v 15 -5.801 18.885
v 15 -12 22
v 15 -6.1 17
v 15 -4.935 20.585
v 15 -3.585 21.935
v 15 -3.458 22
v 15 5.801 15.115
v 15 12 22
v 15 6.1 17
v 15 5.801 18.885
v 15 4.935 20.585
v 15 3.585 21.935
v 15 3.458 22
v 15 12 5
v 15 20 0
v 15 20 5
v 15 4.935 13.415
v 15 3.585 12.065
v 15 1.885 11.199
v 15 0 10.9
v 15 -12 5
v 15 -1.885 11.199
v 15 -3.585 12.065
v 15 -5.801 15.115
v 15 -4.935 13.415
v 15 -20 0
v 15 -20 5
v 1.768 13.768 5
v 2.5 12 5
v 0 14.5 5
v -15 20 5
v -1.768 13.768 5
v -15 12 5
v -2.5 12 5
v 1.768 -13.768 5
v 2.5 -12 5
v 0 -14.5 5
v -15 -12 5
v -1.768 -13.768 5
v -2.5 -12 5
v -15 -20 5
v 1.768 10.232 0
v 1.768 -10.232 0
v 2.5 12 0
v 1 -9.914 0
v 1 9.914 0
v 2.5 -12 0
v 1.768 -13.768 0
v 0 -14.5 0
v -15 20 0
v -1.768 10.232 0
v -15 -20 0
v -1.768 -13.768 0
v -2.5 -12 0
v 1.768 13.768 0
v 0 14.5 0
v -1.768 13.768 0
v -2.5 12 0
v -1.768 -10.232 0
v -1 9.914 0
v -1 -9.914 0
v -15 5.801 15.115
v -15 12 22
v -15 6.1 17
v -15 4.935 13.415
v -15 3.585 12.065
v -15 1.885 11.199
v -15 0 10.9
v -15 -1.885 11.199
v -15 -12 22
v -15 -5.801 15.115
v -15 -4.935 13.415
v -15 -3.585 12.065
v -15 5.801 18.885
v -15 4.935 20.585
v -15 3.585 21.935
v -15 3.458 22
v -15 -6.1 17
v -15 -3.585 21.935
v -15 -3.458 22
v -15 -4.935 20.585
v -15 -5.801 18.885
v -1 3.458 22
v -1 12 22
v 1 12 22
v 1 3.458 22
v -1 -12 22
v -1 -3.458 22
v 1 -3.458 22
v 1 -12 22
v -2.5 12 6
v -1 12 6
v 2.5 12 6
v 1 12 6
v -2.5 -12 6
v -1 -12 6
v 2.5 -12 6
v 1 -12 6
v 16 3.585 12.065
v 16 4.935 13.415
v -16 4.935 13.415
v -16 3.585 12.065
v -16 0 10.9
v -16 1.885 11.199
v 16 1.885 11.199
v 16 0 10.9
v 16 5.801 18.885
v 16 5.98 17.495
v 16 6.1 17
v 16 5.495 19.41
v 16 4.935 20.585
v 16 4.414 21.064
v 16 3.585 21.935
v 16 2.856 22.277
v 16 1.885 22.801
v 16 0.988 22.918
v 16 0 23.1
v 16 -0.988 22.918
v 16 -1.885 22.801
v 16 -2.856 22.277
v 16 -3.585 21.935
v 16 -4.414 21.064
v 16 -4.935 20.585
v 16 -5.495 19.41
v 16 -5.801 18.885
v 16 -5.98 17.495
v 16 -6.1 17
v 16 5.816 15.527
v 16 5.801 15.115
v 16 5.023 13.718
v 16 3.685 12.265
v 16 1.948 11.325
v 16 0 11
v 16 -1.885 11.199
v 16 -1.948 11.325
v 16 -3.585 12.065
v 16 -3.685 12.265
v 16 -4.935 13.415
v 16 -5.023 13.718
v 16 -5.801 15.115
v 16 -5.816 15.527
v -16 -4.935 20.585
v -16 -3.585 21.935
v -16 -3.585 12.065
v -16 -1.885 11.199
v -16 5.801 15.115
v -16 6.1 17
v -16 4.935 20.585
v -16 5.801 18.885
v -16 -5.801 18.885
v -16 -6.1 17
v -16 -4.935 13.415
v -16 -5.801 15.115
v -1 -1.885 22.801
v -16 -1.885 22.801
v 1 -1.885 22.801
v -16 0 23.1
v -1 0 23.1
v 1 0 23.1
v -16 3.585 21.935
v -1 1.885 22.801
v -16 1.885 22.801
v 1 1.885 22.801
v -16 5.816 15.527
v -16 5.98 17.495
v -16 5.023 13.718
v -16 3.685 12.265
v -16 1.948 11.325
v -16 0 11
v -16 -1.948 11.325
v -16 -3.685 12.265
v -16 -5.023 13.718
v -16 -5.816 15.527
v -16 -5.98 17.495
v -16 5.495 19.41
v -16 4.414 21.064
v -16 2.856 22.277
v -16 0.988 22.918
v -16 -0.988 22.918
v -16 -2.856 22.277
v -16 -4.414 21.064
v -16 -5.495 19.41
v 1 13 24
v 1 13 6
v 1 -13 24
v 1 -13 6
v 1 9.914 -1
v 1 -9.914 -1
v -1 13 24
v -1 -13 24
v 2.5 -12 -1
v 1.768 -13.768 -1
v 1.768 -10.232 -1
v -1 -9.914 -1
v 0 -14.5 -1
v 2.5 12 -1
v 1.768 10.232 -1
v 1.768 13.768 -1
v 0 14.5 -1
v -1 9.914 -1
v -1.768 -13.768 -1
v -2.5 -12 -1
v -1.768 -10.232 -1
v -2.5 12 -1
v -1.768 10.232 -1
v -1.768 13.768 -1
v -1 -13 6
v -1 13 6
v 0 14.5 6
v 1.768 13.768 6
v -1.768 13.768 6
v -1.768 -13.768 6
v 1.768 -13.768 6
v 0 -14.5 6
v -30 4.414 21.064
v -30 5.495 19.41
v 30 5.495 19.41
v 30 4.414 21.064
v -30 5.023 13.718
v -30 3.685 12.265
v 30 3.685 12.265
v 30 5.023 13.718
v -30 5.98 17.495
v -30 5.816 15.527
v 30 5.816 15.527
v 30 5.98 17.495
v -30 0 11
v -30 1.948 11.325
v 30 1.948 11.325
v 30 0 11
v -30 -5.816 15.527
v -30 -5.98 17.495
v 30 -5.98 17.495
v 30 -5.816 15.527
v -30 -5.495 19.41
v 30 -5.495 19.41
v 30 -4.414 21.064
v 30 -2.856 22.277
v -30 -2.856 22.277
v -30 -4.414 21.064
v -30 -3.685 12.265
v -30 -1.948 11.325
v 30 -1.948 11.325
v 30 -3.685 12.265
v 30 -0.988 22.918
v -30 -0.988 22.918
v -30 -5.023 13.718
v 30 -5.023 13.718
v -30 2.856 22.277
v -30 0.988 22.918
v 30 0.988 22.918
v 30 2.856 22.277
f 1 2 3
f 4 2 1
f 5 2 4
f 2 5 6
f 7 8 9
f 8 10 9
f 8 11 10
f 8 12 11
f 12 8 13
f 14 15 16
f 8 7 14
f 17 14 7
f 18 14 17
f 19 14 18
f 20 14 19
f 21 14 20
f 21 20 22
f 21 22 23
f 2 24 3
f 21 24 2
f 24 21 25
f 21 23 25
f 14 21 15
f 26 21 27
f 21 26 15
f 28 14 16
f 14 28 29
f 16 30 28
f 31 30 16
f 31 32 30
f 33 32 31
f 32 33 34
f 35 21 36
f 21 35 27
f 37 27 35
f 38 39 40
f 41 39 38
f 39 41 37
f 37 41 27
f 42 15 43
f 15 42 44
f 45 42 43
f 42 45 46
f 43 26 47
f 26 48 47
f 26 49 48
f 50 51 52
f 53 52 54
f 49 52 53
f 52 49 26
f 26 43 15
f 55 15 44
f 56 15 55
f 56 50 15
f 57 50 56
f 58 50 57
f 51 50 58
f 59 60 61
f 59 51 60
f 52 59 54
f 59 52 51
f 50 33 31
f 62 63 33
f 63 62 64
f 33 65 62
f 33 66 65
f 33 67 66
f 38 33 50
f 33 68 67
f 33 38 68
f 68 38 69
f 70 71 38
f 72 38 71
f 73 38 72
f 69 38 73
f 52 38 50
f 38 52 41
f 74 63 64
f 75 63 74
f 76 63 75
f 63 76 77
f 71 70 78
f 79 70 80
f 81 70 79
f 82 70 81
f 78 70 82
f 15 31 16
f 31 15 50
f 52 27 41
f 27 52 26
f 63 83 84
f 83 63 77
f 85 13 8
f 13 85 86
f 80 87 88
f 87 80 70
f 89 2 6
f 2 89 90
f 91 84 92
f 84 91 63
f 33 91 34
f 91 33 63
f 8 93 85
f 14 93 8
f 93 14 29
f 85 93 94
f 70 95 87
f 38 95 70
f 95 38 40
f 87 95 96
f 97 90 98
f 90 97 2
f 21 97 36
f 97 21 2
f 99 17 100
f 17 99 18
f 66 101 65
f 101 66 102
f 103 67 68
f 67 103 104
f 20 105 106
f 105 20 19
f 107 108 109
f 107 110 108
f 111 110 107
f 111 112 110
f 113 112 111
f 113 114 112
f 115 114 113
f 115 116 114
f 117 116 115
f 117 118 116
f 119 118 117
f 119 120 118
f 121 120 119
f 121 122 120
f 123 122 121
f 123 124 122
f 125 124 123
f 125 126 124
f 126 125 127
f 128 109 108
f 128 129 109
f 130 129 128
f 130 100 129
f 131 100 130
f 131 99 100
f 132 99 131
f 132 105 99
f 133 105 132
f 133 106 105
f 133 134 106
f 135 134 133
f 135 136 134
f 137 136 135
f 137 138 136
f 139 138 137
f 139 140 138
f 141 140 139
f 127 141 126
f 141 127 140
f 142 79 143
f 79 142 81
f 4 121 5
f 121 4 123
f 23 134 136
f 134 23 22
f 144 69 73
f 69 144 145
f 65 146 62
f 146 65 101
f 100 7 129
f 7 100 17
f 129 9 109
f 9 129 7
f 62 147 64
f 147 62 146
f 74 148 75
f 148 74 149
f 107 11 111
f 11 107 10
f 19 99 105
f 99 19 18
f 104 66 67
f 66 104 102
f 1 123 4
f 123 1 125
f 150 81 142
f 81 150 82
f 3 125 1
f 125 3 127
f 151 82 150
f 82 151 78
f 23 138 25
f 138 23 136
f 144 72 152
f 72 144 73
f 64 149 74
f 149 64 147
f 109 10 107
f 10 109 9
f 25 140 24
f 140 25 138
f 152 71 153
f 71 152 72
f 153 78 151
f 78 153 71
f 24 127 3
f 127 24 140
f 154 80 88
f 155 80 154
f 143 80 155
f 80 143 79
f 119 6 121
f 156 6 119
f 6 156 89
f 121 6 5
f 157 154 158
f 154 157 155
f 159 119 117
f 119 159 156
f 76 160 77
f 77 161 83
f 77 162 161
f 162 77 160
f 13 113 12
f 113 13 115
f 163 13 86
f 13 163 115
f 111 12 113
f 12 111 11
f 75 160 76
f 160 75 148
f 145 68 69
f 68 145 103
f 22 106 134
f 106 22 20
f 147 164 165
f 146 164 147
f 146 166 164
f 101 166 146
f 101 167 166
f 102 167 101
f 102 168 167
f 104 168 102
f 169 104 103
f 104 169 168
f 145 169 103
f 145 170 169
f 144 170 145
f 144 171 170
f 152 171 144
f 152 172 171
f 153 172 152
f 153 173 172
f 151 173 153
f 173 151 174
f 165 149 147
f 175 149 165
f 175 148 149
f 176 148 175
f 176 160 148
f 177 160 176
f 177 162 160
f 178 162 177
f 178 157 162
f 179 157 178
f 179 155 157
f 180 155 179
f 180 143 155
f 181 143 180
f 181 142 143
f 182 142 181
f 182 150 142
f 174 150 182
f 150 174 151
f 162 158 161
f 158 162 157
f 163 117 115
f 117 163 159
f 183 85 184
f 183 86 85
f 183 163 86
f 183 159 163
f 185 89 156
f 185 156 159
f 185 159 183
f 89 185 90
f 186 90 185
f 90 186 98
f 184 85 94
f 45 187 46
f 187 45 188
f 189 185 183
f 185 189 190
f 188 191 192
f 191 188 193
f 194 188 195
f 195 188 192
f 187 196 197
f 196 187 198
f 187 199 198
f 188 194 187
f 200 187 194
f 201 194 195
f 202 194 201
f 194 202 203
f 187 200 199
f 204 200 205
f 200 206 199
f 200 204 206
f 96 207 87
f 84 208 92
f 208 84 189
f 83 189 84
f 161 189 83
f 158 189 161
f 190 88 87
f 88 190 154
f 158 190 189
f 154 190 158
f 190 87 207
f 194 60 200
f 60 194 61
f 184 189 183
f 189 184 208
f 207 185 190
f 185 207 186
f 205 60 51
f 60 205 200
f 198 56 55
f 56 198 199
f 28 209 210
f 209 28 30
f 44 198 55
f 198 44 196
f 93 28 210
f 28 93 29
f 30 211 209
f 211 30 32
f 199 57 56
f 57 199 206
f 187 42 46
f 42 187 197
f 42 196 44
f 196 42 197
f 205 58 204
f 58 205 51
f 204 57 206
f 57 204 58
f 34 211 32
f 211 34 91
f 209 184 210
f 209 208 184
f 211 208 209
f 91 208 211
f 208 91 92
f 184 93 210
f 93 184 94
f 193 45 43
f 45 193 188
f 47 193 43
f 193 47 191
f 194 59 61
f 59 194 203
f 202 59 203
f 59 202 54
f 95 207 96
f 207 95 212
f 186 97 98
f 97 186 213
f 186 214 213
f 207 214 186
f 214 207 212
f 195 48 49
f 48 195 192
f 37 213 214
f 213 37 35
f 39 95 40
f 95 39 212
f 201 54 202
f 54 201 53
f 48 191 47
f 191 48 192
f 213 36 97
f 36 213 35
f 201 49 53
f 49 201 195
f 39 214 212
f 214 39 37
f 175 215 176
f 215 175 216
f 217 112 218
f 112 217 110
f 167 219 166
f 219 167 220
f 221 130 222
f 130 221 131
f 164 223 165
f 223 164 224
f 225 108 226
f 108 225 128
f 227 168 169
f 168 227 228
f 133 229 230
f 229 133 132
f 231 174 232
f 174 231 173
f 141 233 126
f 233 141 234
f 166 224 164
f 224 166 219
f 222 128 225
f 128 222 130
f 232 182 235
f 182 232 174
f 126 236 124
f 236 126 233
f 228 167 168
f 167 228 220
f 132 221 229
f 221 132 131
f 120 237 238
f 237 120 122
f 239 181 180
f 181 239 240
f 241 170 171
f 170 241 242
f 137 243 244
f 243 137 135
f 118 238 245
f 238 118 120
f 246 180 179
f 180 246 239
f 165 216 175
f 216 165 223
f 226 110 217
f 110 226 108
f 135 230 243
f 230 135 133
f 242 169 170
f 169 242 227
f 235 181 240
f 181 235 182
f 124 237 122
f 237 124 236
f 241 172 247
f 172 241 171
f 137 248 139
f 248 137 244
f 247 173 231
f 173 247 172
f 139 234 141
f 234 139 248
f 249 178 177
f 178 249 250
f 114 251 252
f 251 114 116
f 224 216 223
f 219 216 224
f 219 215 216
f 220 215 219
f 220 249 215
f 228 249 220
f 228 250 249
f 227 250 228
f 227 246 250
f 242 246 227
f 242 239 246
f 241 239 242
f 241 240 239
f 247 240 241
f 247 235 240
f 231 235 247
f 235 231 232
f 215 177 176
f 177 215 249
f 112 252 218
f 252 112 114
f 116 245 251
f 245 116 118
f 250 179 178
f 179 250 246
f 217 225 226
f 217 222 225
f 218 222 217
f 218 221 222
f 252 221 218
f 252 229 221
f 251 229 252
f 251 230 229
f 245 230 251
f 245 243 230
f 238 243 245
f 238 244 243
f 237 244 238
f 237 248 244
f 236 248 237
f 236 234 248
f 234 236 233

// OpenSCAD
// Parameters
rod_diameter = 12.0; //[6.0:24.0:0.1]
rod_length = 60.0; //[30.0:120.0:1]
bracket_height = 23.0; //[12.0:46.0:0.1]
clearance_diameter = 0.2; //[0.0:0.6:0.05]
wall_thickness = 4.0; //[2.0:8.0:0.1]
base_thickness = 5.0; //[3.0:10.0:0.1]
base_width = 30.0; //[15.0:60.0:0.5]
base_length = 40.0; //[20.0:80.0:0.5]
mount_hole_diameter = 5.0; //[3.0:8.0:0.1]
mount_hole_spacing = 24.0; //[12.0:48.0:0.5]
bore_center_height_from_base = 17.0; //[10.0:30.0:0.1]
clamp_gap = 2.0; //[1.0:6.0:0.1]
retention_screw_diameter = 5.0; //[3.0:8.0:0.1]
retention_boss_diameter = 12.0; //[8.0:20.0:0.1]
overlap = 1.0; //[0.5:2.0:0.1]

// SK12 Bracket - complete geometry
module sk_bracket() {
  color("Silver") {
    // Base
    translate([0, 0, base_thickness/2])
      cube([base_width, base_length, base_thickness], center=true);
    
    // Main Bracket Body
    translate([0, 0, base_thickness + (bracket_height - base_thickness)/2 - overlap])
      cube([base_width, base_length*0.6, bracket_height - base_thickness], center=true);
    
    // Rod Retention Feature
    translate([0, 0, bore_center_height_from_base])
      rotate([0, 90, 0])
      cylinder(r=retention_boss_diameter/2, h=base_width, center=true);
    
    // Rod Support Bore or Cradle
    translate([0, 0, bore_center_height_from_base])
      rotate([0, 90, 0])
      cylinder(r=(rod_diameter + clearance_diameter)/2, h=base_width + 2*overlap, center=true);
    
    // Clamp Gap Cut
    translate([0, 0, bracket_height/2])
      cube([clamp_gap, base_length*0.6 + 2*overlap, bracket_height + 2*overlap], center=true);
    
    // Mounting Holes
    translate([0, mount_hole_spacing/2, base_thickness/2])
      cylinder(r=mount_hole_diameter/2, h=base_thickness + 2*overlap, center=true);
    translate([0, -mount_hole_spacing/2, base_thickness/2])
      cylinder(r=mount_hole_diameter/2, h=base_thickness + 2*overlap, center=true);
    
    // Retention Screw Hole
    translate([0, 0, bore_center_height_from_base])
      rotate([0, 90, 0])
      cylinder(r=retention_screw_diameter/2, h=base_width + 2*overlap, center=true);
  }
}

// Rod - complete geometry
module rod() {
  color("DimGray") {
    translate([0, 0, bore_center_height_from_base])
      rotate([0, 90, 0])
      cylinder(r=rod_diameter/2, h=rod_length, center=true);
  }
}

// Assembly
module assembly() {
  sk_bracket();
  rod();
}

assembly();
